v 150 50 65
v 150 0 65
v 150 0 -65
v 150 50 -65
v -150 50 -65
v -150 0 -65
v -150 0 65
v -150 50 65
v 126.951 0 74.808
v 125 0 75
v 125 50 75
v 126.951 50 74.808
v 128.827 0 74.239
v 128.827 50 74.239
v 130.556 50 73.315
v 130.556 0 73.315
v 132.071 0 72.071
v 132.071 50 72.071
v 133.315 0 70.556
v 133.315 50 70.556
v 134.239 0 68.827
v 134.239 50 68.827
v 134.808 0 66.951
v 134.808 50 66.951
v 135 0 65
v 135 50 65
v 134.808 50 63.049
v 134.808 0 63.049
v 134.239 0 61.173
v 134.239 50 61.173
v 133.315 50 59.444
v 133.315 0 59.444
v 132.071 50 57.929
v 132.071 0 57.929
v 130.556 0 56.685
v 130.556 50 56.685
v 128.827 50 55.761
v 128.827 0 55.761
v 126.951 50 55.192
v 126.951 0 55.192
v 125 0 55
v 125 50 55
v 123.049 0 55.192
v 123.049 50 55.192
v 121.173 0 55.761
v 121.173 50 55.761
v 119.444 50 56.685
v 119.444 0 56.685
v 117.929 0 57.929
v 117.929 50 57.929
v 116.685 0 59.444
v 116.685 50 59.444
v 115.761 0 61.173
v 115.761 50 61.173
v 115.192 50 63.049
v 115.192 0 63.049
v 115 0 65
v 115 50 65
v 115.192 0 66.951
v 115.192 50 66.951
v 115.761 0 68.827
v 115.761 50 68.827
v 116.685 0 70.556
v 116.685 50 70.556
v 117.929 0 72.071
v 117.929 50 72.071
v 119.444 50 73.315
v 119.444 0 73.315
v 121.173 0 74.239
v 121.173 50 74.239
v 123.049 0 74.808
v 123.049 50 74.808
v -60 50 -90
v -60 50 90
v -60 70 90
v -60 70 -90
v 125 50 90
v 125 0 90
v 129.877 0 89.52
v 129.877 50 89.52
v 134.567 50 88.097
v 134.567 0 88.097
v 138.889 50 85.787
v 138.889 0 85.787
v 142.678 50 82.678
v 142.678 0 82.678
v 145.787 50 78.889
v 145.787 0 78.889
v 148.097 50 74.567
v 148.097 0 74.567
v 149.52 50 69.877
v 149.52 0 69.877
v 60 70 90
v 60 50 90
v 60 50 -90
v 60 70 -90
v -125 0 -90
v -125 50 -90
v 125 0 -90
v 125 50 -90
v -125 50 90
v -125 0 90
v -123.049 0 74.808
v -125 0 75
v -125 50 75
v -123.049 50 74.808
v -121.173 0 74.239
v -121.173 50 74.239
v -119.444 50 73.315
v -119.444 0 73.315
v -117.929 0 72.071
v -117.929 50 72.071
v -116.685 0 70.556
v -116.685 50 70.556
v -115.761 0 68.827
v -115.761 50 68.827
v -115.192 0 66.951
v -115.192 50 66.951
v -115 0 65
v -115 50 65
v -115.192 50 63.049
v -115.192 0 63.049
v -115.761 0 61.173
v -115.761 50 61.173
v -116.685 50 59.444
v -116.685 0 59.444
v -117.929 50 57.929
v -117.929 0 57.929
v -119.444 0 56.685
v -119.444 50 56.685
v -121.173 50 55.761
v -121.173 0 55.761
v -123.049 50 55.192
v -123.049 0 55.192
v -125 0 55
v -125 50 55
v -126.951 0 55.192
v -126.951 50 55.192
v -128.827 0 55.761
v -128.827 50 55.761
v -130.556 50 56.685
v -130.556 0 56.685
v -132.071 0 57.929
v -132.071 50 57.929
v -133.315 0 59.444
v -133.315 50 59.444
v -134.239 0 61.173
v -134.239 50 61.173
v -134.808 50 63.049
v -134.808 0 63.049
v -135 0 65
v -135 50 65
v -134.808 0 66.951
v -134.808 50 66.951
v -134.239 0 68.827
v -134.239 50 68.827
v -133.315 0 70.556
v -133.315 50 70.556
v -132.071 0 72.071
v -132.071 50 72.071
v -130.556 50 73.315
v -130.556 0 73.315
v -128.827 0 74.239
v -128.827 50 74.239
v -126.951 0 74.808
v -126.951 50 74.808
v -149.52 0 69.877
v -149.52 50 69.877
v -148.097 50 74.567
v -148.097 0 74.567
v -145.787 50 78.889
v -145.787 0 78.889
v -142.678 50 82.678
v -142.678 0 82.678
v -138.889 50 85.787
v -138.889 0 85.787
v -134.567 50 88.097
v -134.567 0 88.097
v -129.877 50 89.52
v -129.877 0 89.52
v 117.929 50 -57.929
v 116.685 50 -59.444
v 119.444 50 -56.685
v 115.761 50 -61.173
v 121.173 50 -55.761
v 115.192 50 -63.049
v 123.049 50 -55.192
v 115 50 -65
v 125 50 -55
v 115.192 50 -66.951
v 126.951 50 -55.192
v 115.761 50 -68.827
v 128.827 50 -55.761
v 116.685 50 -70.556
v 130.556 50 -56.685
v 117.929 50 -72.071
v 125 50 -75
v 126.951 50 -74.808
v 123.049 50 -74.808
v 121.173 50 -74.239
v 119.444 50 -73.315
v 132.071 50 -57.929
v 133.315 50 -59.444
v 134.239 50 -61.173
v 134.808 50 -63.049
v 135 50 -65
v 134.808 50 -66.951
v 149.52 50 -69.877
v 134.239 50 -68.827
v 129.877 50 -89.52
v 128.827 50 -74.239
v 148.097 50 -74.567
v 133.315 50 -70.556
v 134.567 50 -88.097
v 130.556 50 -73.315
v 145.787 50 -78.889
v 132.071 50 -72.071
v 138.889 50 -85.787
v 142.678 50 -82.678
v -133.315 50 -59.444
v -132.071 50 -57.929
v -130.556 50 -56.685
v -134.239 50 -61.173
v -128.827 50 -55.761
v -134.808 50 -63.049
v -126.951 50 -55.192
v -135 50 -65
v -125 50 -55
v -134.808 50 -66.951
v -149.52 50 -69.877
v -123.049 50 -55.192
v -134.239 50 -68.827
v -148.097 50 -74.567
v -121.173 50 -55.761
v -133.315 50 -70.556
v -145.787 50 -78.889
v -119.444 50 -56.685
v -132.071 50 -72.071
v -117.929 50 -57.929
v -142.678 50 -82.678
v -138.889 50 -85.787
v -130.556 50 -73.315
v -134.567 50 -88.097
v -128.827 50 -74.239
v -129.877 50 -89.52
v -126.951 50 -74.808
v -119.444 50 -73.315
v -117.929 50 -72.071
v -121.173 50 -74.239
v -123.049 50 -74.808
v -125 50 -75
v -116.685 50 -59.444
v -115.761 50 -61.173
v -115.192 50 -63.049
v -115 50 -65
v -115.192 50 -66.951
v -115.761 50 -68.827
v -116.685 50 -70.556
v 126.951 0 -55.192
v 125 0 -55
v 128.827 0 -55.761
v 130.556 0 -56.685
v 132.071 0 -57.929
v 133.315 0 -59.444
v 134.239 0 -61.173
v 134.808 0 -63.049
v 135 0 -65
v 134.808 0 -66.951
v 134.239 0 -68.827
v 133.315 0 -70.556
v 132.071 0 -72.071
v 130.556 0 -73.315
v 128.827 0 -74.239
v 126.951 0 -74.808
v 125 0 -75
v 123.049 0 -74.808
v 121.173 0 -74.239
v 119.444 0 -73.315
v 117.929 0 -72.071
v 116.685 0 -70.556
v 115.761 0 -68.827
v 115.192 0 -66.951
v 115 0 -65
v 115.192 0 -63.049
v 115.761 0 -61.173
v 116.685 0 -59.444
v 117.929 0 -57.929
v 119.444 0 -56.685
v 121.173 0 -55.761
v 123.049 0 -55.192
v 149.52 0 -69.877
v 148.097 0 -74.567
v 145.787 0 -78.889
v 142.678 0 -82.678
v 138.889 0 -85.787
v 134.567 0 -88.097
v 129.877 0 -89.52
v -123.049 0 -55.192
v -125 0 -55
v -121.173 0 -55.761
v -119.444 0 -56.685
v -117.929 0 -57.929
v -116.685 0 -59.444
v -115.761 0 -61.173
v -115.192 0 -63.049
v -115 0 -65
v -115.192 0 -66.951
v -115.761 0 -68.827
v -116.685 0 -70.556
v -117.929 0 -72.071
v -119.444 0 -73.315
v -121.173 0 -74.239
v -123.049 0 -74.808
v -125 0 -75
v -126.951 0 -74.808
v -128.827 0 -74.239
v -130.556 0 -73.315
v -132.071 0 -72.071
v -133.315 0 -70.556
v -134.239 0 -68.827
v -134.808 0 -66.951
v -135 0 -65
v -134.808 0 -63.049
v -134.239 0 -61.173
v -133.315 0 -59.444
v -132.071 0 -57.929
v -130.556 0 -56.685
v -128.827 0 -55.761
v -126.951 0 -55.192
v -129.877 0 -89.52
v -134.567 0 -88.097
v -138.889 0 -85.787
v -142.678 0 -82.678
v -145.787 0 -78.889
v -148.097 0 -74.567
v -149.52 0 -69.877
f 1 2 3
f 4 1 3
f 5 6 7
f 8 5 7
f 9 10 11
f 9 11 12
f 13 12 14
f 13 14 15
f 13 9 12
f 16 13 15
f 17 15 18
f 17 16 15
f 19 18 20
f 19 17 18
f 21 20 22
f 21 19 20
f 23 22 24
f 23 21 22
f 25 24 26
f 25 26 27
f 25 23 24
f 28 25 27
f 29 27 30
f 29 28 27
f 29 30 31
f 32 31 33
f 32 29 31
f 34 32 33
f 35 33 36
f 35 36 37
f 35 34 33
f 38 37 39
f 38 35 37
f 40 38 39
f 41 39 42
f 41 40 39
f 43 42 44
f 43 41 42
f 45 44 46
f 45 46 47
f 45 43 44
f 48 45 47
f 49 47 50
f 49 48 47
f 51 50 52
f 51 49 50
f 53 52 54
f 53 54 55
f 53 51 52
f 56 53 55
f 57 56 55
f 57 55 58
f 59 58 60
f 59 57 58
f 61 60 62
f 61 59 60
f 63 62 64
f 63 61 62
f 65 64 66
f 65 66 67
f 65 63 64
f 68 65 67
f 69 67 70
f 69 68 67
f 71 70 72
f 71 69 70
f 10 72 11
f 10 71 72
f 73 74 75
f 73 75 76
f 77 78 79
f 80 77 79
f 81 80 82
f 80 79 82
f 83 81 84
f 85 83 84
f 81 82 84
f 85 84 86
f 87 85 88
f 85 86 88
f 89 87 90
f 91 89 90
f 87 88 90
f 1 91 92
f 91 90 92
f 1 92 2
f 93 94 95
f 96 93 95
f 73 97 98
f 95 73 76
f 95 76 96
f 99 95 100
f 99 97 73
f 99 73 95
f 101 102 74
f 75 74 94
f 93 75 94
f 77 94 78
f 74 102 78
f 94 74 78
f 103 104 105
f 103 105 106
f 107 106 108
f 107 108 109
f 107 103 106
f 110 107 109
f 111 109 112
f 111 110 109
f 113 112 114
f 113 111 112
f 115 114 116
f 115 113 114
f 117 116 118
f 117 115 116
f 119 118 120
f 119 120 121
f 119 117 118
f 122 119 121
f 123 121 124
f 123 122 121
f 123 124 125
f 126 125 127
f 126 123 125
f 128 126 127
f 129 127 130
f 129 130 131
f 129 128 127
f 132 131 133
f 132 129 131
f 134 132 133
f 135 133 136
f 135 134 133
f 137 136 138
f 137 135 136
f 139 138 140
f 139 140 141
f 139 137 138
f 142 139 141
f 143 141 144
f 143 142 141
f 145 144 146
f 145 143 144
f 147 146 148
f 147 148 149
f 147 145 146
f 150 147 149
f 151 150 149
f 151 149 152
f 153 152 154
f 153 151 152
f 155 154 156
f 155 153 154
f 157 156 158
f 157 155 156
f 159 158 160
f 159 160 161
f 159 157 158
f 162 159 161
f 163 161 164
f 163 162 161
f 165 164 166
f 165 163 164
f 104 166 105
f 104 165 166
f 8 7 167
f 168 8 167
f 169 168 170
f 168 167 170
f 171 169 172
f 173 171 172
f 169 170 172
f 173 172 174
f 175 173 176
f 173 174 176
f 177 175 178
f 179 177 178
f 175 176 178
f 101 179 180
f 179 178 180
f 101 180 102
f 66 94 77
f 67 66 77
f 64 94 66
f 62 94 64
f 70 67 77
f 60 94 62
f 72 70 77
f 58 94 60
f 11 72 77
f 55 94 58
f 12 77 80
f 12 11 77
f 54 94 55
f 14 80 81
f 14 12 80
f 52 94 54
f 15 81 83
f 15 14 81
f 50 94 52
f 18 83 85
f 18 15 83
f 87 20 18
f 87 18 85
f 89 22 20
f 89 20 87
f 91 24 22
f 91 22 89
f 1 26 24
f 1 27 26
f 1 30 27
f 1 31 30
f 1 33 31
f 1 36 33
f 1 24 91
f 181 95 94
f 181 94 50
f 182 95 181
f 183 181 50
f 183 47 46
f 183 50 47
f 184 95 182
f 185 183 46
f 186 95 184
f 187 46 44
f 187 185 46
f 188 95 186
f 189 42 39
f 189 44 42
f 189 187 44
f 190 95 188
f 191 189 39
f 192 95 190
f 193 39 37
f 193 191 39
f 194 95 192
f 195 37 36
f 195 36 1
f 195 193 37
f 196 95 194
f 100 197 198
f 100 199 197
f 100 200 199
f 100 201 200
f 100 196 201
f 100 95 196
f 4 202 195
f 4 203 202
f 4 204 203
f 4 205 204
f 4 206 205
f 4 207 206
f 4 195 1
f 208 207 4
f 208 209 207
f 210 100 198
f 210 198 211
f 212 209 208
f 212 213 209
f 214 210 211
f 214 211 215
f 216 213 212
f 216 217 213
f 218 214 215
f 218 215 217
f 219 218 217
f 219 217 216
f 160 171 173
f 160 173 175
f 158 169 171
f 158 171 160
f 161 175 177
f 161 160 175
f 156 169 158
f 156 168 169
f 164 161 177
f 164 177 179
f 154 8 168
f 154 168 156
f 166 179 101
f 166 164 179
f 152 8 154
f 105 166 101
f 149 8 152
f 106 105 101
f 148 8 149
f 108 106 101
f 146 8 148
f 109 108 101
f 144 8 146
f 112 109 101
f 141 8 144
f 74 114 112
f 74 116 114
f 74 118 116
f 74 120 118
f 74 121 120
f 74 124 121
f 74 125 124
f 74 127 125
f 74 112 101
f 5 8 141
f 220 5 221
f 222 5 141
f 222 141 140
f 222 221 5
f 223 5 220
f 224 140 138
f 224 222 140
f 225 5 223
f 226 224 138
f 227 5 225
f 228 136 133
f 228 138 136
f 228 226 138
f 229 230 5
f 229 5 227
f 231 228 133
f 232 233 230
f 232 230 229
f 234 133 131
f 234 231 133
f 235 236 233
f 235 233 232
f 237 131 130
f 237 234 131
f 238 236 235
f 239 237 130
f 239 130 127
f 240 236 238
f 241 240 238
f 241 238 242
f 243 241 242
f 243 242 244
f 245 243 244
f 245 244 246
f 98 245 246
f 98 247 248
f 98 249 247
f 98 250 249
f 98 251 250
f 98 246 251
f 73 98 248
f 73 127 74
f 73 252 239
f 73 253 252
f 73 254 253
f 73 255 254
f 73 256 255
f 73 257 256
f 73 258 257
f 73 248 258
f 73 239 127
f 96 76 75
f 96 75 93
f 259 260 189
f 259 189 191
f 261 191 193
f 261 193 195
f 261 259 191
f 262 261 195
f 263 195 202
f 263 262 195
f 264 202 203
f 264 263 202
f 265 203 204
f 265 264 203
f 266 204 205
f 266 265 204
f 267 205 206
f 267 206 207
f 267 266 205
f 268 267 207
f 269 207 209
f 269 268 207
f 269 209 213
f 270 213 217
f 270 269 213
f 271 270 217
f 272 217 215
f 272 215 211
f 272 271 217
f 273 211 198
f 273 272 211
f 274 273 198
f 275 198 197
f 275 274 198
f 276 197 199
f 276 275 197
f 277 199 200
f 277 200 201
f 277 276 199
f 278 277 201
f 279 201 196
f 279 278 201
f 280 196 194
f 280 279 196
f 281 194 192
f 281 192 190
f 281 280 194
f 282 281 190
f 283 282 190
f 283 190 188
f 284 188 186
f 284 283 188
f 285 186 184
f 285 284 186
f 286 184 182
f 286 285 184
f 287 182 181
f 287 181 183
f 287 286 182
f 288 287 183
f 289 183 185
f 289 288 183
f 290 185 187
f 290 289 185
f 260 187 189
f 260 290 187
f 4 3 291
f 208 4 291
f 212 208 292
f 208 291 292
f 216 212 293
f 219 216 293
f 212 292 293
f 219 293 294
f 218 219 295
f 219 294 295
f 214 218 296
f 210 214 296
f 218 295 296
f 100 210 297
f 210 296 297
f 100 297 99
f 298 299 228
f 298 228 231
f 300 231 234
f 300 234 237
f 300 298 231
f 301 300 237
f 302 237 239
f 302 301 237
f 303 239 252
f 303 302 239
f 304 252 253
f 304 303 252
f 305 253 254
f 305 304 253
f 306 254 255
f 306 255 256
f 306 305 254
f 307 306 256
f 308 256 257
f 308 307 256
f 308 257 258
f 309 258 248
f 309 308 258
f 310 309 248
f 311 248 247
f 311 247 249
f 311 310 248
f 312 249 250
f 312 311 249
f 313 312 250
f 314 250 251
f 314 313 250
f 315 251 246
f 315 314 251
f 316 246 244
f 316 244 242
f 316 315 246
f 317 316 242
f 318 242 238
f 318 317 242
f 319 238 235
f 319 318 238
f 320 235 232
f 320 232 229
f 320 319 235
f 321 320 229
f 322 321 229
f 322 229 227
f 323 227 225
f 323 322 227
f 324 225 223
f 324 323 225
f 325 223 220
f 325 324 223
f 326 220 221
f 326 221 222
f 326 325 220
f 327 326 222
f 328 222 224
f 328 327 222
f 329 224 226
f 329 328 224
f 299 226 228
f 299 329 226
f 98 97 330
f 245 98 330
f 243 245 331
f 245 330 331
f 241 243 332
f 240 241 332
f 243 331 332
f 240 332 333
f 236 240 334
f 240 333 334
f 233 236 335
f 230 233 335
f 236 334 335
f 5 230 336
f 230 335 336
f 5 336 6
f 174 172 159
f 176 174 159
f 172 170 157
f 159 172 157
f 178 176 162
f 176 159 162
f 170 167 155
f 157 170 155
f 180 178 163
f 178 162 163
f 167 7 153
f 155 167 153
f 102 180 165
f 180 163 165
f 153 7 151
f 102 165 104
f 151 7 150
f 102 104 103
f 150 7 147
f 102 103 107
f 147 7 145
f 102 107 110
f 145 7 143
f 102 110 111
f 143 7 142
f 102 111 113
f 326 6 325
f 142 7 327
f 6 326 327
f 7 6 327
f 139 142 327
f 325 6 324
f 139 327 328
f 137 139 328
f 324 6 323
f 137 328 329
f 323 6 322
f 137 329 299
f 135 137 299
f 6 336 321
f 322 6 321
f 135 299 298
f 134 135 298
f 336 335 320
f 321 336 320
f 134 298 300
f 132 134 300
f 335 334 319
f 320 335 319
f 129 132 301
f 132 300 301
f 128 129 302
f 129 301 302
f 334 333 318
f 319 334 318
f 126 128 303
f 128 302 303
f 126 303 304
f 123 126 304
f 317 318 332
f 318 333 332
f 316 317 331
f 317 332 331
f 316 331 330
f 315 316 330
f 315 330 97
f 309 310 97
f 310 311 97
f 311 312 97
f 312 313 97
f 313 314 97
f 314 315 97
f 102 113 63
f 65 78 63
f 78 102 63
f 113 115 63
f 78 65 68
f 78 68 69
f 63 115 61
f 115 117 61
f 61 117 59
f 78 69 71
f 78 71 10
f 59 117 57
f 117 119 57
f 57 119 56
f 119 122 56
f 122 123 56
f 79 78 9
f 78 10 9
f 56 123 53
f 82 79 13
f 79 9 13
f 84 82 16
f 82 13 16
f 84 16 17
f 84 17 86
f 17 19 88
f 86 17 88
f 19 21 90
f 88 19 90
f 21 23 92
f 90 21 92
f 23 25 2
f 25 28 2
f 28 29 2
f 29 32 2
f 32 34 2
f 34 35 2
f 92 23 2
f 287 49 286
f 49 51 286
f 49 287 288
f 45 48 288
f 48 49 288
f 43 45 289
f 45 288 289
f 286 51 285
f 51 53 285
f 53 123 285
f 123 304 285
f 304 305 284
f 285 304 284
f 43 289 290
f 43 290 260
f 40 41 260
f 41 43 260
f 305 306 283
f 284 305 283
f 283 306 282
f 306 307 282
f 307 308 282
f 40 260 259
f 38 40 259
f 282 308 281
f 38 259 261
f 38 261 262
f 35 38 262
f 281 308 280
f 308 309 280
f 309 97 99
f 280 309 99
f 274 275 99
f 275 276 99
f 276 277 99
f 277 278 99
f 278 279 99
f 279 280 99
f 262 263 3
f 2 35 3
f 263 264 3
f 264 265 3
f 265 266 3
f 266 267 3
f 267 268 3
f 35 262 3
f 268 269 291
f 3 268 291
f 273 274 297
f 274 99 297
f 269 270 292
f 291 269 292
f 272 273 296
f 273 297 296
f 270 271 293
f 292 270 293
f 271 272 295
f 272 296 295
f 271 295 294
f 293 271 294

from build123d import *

# Parameters (mm, degrees)
ESQUISSE1_R          = 10
BOSS_EXTRU_1_DEPTH   = 50
BOSS_EXTRU_1_2_DEPTH = 50
ESQUISSE1_3_W        = 120
ESQUISSE1_3_H        = 180
BOSS_EXTRU_2_DEPTH   = 70


with BuildPart() as part:
    # Esquisse1 → Boss.-Extru.1 (new body)
    with BuildSketch(Plane(origin=(0, 0, 0), x_dir=(1, 0, 0), z_dir=(0, 1, 0))):
        with BuildLine():
            Line((-60, -90), (-60, 90))
            Line((-60, 90), (-125, 90))
            ThreePointArc((-125, 90), (-142.67766953, 82.67766953), (-150, 65))
            Line((-150, 65), (-150, -65))
            ThreePointArc((-150, -65), (-142.67766953, -82.67766953), (-125, -90))
            Line((-125, -90), (-60, -90))
        make_face()
        with Locations((-125, -65)):
            Circle(ESQUISSE1_R, mode=Mode.SUBTRACT)
        with Locations((-125, 65)):
            Circle(ESQUISSE1_R, mode=Mode.SUBTRACT)
    extrude(amount=BOSS_EXTRU_1_DEPTH)



with BuildPart() as body_2:
    # Esquisse1 → Boss.-Extru.1 2 (new body)
    with BuildSketch(Plane(origin=(0, 0, 0), x_dir=(1, 0, 0), z_dir=(0, 1, 0))):
        with BuildLine():
            Line((125, 90), (60, 90))
            Line((60, 90), (60, -90))
            Line((60, -90), (125, -90))
            ThreePointArc((125, -90), (142.67766953, -82.67766953), (150, -65))
            Line((150, -65), (150, 65))
            ThreePointArc((150, 65), (142.67766953, 82.67766953), (125, 90))
        make_face()
        with Locations((125, -65)):
            Circle(ESQUISSE1_R, mode=Mode.SUBTRACT)
        with Locations((125, 65)):
            Circle(ESQUISSE1_R, mode=Mode.SUBTRACT)
    extrude(amount=BOSS_EXTRU_1_2_DEPTH)


with BuildPart() as part_1:
    add(part.part)

    add(body_2.part)  # Boss.-Extru.2 merges body 2
    # Esquisse1<3> → Boss.-Extru.2 (add)
    with BuildSketch(Plane(origin=(0, 0, 0), x_dir=(1, 0, 0), z_dir=(0, 1, 0))):
        Rectangle(ESQUISSE1_3_W, ESQUISSE1_3_H)
    extrude(amount=BOSS_EXTRU_2_DEPTH)


solid = part_1.part
